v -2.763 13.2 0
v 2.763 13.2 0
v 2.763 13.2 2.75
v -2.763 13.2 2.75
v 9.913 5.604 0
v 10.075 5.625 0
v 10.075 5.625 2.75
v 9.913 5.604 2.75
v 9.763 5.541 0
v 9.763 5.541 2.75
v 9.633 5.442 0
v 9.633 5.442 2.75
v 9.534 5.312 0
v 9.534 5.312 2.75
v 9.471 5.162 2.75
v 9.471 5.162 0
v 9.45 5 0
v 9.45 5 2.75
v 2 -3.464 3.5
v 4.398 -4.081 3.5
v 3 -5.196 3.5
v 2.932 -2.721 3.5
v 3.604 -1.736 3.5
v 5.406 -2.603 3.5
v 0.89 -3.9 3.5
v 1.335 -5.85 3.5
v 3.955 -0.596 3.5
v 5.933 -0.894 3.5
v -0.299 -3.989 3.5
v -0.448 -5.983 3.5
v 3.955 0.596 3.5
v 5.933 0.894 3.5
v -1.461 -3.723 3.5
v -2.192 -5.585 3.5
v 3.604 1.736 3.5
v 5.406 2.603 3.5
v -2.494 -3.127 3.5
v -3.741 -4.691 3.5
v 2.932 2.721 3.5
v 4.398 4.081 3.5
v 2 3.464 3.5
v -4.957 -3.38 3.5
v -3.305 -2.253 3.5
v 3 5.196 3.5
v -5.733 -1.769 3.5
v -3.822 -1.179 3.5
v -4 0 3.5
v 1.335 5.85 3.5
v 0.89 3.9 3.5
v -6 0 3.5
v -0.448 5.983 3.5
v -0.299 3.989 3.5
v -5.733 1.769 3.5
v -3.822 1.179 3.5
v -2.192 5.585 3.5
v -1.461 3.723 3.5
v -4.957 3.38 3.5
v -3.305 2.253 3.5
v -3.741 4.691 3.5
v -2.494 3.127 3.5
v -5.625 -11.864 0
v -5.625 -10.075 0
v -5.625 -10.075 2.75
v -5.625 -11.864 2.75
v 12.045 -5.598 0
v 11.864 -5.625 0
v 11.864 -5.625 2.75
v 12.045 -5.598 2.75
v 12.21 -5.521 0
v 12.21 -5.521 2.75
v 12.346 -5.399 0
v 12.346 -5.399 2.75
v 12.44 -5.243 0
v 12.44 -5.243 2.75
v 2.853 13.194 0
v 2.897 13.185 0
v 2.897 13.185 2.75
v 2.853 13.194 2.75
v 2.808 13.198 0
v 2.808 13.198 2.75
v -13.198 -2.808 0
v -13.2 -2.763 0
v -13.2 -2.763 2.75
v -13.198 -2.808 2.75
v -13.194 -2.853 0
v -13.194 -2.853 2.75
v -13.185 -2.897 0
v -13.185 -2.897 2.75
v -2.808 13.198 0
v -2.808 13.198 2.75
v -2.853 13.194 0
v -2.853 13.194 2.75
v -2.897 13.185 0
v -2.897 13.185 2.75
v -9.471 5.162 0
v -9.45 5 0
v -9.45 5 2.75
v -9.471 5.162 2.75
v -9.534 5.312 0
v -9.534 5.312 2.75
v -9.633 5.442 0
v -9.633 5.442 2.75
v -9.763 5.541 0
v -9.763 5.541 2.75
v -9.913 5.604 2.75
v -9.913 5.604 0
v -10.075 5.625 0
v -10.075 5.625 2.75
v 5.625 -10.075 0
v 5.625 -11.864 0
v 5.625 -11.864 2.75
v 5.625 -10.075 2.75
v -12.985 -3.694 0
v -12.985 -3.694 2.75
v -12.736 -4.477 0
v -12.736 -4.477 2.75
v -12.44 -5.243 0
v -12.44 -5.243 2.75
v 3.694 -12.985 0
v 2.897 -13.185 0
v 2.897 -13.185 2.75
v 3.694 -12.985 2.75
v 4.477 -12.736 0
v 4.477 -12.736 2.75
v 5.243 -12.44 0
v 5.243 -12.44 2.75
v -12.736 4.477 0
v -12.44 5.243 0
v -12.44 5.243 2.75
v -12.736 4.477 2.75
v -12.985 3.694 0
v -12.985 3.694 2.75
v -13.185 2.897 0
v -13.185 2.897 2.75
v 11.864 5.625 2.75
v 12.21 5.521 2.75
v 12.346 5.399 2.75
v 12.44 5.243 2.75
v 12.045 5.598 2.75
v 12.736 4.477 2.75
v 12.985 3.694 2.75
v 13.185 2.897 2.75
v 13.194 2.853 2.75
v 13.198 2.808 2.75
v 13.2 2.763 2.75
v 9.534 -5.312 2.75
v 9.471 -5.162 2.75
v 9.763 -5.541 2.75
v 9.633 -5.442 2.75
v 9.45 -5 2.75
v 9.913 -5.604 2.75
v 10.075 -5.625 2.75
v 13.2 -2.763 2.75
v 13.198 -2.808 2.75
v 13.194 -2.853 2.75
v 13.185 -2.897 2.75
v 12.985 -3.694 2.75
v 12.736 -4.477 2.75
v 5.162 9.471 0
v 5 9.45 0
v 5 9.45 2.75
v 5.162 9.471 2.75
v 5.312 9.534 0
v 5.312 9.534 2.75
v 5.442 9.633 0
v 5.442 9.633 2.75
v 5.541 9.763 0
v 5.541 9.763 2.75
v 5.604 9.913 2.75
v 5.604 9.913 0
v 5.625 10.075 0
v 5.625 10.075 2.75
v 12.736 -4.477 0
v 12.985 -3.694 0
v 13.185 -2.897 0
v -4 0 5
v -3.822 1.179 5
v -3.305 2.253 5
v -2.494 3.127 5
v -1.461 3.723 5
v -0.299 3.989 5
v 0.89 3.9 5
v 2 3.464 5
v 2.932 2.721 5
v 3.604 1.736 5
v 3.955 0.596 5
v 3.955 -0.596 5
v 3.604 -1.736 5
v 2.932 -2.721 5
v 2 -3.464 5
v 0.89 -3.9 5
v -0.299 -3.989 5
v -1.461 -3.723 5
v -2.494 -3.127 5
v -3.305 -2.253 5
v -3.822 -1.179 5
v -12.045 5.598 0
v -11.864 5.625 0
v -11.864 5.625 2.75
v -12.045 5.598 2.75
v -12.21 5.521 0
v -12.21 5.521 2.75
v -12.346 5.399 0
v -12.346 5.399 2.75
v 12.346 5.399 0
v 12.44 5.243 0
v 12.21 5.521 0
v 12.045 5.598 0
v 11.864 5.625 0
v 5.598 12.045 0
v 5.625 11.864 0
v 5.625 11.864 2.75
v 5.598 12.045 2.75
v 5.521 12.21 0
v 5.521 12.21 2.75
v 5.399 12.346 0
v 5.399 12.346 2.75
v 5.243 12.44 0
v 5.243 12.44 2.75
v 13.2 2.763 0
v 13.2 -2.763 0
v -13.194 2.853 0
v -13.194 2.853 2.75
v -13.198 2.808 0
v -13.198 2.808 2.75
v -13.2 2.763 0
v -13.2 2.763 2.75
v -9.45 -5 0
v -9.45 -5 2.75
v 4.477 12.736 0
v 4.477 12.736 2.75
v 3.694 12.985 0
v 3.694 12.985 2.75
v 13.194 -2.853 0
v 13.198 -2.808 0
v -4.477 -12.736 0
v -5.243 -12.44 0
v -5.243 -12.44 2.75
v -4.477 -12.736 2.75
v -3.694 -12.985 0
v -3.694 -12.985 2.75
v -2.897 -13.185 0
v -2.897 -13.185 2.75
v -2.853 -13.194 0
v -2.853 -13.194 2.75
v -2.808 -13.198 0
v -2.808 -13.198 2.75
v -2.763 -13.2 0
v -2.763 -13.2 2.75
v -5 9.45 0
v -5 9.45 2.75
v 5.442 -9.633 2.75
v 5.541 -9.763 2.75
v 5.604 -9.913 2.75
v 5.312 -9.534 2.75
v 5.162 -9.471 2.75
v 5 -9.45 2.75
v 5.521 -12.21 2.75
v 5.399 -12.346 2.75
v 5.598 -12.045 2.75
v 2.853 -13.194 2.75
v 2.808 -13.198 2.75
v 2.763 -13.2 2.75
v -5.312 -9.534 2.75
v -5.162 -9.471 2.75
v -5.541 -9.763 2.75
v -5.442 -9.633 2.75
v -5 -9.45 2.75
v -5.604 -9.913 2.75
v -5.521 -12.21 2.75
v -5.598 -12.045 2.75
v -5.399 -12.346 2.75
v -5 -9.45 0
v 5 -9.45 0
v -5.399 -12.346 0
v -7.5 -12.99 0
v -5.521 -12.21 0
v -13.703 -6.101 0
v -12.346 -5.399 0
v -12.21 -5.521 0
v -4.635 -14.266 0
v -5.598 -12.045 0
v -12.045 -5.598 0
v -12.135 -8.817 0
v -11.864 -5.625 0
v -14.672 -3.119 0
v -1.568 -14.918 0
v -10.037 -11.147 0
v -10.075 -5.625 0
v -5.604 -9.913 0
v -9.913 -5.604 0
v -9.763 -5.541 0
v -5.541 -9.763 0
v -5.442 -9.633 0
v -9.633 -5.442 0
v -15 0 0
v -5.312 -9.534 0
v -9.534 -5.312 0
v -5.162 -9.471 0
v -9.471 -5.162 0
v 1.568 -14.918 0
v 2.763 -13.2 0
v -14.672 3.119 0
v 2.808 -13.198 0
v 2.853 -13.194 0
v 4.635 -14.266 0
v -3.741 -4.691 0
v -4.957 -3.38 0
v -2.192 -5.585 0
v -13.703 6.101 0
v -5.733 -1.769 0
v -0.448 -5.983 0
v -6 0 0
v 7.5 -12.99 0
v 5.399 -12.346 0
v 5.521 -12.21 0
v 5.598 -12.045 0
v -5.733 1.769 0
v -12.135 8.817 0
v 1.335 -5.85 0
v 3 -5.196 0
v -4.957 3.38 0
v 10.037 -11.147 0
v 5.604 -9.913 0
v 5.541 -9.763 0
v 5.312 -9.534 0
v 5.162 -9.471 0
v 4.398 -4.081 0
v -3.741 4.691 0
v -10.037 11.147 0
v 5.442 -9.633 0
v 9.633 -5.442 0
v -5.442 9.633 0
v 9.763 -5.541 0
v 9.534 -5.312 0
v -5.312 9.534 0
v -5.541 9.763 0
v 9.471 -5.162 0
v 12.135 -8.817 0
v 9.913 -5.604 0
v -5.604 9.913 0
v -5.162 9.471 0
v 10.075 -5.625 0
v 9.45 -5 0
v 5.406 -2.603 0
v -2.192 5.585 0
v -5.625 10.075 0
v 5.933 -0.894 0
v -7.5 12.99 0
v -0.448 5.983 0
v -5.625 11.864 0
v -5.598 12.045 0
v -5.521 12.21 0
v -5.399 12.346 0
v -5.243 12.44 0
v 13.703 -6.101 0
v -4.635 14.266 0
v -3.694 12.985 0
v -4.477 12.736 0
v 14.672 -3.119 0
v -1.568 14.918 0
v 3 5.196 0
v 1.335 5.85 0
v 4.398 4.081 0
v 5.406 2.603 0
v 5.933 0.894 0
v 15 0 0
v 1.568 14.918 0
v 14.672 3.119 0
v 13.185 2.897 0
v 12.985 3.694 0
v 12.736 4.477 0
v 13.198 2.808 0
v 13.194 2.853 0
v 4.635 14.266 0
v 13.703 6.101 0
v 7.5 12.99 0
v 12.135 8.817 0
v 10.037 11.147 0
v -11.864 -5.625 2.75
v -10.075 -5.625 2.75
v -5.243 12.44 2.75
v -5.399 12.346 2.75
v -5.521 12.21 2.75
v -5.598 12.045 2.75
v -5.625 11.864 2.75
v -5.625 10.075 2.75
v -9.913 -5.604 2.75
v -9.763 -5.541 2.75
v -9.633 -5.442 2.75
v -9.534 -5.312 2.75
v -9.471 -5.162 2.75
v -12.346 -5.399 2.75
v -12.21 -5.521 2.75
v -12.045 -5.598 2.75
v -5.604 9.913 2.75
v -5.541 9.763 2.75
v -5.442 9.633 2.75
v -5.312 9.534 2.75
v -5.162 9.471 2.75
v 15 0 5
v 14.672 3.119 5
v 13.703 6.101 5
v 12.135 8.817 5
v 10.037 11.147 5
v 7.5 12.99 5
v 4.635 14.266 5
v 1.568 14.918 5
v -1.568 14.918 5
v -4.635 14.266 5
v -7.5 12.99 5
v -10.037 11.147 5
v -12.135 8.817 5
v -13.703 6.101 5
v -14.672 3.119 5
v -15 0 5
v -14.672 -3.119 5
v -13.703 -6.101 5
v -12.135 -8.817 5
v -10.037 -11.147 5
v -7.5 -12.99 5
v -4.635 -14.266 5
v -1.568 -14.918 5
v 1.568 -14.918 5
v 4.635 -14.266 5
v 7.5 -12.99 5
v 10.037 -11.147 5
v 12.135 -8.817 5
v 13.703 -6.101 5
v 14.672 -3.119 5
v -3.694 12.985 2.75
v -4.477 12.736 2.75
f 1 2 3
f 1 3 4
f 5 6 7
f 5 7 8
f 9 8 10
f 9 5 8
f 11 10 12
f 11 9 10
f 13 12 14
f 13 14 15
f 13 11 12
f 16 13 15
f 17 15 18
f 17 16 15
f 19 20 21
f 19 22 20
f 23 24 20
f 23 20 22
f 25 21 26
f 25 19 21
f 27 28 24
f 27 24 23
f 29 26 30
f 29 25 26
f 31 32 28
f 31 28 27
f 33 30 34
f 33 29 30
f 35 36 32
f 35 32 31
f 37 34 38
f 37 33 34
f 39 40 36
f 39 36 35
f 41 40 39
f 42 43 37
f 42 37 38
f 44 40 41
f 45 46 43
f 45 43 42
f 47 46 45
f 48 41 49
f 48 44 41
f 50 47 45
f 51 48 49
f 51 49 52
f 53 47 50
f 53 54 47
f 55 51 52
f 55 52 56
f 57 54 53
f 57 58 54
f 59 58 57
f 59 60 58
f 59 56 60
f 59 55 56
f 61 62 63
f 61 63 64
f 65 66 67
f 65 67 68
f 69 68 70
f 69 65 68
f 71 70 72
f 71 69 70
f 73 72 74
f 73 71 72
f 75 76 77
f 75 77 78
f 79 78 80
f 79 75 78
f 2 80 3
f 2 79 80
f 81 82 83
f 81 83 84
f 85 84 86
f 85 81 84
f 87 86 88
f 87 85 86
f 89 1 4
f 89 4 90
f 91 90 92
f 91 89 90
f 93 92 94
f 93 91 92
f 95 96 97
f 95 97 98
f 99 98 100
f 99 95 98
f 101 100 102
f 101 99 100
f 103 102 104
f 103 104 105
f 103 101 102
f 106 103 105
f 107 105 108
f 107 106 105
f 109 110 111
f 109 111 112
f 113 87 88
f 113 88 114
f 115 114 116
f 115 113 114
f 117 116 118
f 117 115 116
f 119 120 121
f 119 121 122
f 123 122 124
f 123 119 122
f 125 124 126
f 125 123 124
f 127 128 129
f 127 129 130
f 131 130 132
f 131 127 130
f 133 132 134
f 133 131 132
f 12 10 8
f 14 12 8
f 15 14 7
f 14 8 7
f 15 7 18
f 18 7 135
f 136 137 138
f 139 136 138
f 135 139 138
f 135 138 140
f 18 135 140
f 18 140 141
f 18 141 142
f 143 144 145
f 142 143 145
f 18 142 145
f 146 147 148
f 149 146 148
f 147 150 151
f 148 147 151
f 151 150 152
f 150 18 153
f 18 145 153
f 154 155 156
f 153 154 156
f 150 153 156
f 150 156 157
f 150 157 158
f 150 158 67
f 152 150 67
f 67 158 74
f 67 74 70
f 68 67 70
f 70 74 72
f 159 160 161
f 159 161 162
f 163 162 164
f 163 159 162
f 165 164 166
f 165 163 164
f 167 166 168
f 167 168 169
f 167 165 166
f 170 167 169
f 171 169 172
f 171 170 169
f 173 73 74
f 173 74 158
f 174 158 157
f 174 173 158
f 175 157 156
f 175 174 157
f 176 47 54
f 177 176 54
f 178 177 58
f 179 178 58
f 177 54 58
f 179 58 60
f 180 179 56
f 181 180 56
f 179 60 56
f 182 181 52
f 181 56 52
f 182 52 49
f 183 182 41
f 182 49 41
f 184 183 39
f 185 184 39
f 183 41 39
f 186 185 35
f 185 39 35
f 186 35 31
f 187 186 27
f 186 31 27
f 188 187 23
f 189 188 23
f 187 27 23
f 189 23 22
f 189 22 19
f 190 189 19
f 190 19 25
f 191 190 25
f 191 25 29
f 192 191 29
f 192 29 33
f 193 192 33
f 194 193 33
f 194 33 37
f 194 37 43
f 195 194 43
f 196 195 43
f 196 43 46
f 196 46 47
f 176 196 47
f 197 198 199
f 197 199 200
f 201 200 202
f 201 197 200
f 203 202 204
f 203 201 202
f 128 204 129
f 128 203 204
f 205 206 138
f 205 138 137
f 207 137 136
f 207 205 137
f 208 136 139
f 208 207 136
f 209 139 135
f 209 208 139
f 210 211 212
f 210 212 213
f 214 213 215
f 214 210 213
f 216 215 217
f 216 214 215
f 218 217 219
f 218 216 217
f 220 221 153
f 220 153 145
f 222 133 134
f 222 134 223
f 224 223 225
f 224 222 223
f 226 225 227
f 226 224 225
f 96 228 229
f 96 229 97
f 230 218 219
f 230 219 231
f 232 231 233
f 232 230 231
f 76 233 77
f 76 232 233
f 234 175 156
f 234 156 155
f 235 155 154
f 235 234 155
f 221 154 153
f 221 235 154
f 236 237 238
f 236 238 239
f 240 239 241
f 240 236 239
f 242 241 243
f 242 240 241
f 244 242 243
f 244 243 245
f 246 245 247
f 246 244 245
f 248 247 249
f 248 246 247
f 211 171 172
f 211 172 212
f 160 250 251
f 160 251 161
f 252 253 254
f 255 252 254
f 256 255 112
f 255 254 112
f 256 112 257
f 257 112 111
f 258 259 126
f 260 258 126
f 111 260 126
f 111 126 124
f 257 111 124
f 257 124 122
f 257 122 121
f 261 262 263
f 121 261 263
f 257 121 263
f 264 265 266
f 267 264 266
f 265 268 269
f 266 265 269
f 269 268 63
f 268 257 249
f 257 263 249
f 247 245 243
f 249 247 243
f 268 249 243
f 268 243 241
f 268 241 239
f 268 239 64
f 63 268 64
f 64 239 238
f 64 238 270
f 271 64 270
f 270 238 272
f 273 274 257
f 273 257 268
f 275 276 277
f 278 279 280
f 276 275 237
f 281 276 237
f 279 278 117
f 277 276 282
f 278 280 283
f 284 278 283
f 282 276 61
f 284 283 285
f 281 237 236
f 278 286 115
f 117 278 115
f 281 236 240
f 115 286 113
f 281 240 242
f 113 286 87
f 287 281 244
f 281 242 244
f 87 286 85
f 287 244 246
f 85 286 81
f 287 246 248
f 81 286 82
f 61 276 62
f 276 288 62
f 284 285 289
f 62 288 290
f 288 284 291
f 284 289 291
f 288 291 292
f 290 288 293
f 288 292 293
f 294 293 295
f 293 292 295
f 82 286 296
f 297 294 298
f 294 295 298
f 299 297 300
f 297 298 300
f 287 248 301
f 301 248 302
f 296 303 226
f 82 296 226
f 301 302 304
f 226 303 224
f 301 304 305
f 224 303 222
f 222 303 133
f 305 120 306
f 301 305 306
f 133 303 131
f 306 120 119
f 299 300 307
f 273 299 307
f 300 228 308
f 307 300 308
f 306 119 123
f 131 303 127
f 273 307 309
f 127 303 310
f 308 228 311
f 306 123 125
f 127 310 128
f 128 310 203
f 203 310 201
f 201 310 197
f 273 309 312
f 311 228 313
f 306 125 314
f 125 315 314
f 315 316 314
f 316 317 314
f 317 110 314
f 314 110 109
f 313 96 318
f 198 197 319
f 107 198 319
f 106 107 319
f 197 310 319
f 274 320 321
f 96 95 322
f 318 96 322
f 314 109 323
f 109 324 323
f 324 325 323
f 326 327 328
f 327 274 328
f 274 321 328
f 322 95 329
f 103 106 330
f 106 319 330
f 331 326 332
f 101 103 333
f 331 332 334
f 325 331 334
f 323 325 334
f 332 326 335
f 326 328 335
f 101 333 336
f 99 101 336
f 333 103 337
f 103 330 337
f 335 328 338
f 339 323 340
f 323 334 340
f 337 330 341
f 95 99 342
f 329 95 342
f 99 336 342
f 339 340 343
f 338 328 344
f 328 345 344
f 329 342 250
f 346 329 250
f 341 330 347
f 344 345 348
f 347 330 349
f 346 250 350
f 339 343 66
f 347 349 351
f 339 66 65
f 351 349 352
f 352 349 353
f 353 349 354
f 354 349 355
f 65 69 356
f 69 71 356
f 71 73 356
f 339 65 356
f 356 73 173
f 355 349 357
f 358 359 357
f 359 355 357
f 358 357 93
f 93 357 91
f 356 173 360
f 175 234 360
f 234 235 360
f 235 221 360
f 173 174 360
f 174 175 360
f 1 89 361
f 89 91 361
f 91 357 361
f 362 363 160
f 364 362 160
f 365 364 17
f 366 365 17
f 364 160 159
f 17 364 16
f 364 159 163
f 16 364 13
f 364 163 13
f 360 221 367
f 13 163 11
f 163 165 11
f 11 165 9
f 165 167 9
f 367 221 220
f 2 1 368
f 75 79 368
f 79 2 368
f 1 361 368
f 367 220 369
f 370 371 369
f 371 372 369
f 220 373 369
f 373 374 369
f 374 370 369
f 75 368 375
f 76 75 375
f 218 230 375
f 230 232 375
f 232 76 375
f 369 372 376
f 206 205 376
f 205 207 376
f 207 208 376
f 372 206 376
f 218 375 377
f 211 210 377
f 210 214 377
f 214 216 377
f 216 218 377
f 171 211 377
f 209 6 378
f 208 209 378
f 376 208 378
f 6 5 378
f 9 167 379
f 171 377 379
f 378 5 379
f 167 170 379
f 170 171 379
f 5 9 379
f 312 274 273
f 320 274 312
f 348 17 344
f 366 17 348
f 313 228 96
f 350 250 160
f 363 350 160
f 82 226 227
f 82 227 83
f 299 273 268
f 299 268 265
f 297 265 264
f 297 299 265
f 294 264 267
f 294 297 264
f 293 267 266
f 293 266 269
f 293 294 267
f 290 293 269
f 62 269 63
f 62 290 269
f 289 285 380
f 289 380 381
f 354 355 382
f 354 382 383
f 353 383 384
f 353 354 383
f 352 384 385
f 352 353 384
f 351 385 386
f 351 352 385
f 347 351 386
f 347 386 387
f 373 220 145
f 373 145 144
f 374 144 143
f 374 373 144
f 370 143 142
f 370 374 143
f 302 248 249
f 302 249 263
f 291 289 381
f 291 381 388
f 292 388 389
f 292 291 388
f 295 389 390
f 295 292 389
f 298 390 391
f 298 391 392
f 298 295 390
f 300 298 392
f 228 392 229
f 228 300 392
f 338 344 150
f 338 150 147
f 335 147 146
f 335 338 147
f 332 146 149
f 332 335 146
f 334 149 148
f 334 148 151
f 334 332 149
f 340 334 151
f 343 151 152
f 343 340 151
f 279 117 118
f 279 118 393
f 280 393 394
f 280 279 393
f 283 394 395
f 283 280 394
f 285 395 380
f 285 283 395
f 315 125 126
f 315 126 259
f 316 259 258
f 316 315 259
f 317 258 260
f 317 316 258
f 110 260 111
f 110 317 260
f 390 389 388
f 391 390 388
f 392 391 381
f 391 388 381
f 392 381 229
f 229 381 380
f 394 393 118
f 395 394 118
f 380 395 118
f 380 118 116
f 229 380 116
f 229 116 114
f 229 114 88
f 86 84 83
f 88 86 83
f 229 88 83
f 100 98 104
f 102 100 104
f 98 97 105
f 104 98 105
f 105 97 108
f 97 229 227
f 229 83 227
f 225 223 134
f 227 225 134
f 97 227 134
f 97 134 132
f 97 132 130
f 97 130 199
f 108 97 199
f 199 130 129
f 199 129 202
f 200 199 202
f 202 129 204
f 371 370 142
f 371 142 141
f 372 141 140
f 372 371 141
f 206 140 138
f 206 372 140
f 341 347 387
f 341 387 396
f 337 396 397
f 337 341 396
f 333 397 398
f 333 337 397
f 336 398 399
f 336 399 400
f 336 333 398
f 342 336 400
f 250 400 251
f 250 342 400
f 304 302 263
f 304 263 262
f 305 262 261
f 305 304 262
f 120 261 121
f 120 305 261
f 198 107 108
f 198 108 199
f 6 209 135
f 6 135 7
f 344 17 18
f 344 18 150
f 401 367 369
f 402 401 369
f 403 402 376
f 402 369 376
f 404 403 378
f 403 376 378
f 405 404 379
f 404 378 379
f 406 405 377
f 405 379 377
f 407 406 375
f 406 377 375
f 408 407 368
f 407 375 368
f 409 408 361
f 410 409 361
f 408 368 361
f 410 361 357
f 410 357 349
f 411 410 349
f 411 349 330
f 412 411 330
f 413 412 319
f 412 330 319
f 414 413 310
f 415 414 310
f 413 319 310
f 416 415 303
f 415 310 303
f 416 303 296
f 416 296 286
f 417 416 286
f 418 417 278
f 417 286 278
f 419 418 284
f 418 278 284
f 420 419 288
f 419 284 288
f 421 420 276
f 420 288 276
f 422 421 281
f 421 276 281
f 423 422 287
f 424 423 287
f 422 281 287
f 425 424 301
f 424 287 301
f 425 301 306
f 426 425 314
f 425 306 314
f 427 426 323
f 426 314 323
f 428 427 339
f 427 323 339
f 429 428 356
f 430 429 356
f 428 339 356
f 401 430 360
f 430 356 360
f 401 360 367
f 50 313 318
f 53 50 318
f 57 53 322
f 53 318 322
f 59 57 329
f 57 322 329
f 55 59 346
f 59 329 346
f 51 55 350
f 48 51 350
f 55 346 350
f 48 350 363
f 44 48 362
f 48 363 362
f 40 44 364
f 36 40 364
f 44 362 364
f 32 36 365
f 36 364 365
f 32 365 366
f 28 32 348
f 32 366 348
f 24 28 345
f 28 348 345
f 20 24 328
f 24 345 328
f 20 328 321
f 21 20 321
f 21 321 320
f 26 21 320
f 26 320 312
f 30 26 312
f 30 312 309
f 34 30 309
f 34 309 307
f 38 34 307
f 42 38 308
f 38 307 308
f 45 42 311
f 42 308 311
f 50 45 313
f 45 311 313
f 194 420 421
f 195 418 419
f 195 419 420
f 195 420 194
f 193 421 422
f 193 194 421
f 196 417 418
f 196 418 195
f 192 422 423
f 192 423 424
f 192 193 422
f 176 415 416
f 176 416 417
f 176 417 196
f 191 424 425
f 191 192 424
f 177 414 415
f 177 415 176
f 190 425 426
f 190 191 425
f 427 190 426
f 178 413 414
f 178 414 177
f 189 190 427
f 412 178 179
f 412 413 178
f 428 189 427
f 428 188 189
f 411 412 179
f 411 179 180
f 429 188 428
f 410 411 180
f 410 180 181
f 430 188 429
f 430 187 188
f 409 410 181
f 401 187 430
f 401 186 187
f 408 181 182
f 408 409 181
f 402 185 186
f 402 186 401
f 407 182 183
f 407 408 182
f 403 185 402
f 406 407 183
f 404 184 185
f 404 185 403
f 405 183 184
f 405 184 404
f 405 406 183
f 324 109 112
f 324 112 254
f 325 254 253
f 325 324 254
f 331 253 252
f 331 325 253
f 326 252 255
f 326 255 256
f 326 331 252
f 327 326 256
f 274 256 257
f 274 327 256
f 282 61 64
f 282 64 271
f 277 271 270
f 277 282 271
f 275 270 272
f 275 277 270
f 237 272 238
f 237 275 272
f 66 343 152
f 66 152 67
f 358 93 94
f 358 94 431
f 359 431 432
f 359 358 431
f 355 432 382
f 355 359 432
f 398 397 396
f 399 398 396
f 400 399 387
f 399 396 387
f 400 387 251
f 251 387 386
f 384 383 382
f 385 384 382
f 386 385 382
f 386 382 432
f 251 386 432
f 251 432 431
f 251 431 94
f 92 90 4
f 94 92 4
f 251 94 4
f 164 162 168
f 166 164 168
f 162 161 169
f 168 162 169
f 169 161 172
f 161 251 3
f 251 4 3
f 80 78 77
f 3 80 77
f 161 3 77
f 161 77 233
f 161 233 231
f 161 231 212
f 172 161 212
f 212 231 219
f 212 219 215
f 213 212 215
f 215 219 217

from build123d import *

# Parameters (mm, degrees)
SKETCH1_R           = 15
BOSS_EXTRUDE1_DEPTH = 5
CUT_EXTRUDE1_DEPTH  = 2.75
CIRPATTERN1_COUNT   = 4
SKETCH2_R           = 4
CUT_EXTRUDE2_DEPTH  = 22.794494718
SKETCH2_3_R         = 6
SKETCH2_3_R_2       = 4
CUT_EXTRUDE3_DEPTH  = 3.5


with BuildPart() as part:
    # Sketch1 → Boss-Extrude1 (new body)
    with BuildSketch(Plane.XY):
        Circle(SKETCH1_R)
    extrude(amount=BOSS_EXTRUDE1_DEPTH)

    # Sketch1<3> → Cut-Extrude1 (cut)
    with BuildSketch(Plane.XY):
        with BuildLine():
            ThreePointArc((-5.625, 10.075), (-5.441941738, 9.633058262), (-5, 9.45))
            Line((-5, 9.45), (5, 9.45))
            ThreePointArc((5, 9.45), (5.441941738, 9.633058262), (5.625, 10.075))
            Line((5.625, 10.075), (5.625, 11.864469015))
            ThreePointArc((5.625, 11.864469015), (5.520732191, 12.210103193), (5.242718447, 12.440414112))
            ThreePointArc((5.242718447, 12.440414112), (4.087012875, 12.866480706), (2.897283889, 13.185436893))
            ThreePointArc((2.897283889, 13.185436893), (2.83061126, 13.196348557), (2.763150376, 13.2))
            Line((2.763150376, 13.2), (-2.763150376, 13.2))
            ThreePointArc((-2.763150376, 13.2), (-2.83061126, 13.196348557), (-2.897283889, 13.185436893))
            ThreePointArc((-2.897283889, 13.185436893), (-4.087012875, 12.866480706), (-5.242718447, 12.440414112))
            ThreePointArc((-5.242718447, 12.440414112), (-5.520732191, 12.210103193), (-5.625, 11.864469015))
            Line((-5.625, 11.864469015), (-5.625, 10.075))
        make_face()
    cut_extrude1 = extrude(amount=CUT_EXTRUDE1_DEPTH, mode=Mode.SUBTRACT)

    # CirPattern1: Cut-Extrude1 ×4 about axis
    cirpattern1_axis = Axis((0, 0, 5.25), (0, 0, -1))
    for i in range(1, CIRPATTERN1_COUNT):
        add(cut_extrude1.rotate(cirpattern1_axis, i * 360 / CIRPATTERN1_COUNT), mode=Mode.SUBTRACT)

    # Sketch2 → Cut-Extrude2 (cut, through all)
    with BuildSketch(Plane(origin=(0, 0, 0), x_dir=(-1, 0, 0), z_dir=(0, 0, -1))):
        Circle(SKETCH2_R)
    extrude(amount=-CUT_EXTRUDE2_DEPTH, mode=Mode.SUBTRACT)

    # Sketch2<3> → Cut-Extrude3 (cut)
    with BuildSketch(Plane(origin=(0, 0, 0), x_dir=(-1, 0, 0), z_dir=(0, 0, -1))):
        Circle(SKETCH2_3_R)
        Circle(SKETCH2_3_R_2, mode=Mode.SUBTRACT)
    extrude(amount=-CUT_EXTRUDE3_DEPTH, mode=Mode.SUBTRACT)


solid = part.part
